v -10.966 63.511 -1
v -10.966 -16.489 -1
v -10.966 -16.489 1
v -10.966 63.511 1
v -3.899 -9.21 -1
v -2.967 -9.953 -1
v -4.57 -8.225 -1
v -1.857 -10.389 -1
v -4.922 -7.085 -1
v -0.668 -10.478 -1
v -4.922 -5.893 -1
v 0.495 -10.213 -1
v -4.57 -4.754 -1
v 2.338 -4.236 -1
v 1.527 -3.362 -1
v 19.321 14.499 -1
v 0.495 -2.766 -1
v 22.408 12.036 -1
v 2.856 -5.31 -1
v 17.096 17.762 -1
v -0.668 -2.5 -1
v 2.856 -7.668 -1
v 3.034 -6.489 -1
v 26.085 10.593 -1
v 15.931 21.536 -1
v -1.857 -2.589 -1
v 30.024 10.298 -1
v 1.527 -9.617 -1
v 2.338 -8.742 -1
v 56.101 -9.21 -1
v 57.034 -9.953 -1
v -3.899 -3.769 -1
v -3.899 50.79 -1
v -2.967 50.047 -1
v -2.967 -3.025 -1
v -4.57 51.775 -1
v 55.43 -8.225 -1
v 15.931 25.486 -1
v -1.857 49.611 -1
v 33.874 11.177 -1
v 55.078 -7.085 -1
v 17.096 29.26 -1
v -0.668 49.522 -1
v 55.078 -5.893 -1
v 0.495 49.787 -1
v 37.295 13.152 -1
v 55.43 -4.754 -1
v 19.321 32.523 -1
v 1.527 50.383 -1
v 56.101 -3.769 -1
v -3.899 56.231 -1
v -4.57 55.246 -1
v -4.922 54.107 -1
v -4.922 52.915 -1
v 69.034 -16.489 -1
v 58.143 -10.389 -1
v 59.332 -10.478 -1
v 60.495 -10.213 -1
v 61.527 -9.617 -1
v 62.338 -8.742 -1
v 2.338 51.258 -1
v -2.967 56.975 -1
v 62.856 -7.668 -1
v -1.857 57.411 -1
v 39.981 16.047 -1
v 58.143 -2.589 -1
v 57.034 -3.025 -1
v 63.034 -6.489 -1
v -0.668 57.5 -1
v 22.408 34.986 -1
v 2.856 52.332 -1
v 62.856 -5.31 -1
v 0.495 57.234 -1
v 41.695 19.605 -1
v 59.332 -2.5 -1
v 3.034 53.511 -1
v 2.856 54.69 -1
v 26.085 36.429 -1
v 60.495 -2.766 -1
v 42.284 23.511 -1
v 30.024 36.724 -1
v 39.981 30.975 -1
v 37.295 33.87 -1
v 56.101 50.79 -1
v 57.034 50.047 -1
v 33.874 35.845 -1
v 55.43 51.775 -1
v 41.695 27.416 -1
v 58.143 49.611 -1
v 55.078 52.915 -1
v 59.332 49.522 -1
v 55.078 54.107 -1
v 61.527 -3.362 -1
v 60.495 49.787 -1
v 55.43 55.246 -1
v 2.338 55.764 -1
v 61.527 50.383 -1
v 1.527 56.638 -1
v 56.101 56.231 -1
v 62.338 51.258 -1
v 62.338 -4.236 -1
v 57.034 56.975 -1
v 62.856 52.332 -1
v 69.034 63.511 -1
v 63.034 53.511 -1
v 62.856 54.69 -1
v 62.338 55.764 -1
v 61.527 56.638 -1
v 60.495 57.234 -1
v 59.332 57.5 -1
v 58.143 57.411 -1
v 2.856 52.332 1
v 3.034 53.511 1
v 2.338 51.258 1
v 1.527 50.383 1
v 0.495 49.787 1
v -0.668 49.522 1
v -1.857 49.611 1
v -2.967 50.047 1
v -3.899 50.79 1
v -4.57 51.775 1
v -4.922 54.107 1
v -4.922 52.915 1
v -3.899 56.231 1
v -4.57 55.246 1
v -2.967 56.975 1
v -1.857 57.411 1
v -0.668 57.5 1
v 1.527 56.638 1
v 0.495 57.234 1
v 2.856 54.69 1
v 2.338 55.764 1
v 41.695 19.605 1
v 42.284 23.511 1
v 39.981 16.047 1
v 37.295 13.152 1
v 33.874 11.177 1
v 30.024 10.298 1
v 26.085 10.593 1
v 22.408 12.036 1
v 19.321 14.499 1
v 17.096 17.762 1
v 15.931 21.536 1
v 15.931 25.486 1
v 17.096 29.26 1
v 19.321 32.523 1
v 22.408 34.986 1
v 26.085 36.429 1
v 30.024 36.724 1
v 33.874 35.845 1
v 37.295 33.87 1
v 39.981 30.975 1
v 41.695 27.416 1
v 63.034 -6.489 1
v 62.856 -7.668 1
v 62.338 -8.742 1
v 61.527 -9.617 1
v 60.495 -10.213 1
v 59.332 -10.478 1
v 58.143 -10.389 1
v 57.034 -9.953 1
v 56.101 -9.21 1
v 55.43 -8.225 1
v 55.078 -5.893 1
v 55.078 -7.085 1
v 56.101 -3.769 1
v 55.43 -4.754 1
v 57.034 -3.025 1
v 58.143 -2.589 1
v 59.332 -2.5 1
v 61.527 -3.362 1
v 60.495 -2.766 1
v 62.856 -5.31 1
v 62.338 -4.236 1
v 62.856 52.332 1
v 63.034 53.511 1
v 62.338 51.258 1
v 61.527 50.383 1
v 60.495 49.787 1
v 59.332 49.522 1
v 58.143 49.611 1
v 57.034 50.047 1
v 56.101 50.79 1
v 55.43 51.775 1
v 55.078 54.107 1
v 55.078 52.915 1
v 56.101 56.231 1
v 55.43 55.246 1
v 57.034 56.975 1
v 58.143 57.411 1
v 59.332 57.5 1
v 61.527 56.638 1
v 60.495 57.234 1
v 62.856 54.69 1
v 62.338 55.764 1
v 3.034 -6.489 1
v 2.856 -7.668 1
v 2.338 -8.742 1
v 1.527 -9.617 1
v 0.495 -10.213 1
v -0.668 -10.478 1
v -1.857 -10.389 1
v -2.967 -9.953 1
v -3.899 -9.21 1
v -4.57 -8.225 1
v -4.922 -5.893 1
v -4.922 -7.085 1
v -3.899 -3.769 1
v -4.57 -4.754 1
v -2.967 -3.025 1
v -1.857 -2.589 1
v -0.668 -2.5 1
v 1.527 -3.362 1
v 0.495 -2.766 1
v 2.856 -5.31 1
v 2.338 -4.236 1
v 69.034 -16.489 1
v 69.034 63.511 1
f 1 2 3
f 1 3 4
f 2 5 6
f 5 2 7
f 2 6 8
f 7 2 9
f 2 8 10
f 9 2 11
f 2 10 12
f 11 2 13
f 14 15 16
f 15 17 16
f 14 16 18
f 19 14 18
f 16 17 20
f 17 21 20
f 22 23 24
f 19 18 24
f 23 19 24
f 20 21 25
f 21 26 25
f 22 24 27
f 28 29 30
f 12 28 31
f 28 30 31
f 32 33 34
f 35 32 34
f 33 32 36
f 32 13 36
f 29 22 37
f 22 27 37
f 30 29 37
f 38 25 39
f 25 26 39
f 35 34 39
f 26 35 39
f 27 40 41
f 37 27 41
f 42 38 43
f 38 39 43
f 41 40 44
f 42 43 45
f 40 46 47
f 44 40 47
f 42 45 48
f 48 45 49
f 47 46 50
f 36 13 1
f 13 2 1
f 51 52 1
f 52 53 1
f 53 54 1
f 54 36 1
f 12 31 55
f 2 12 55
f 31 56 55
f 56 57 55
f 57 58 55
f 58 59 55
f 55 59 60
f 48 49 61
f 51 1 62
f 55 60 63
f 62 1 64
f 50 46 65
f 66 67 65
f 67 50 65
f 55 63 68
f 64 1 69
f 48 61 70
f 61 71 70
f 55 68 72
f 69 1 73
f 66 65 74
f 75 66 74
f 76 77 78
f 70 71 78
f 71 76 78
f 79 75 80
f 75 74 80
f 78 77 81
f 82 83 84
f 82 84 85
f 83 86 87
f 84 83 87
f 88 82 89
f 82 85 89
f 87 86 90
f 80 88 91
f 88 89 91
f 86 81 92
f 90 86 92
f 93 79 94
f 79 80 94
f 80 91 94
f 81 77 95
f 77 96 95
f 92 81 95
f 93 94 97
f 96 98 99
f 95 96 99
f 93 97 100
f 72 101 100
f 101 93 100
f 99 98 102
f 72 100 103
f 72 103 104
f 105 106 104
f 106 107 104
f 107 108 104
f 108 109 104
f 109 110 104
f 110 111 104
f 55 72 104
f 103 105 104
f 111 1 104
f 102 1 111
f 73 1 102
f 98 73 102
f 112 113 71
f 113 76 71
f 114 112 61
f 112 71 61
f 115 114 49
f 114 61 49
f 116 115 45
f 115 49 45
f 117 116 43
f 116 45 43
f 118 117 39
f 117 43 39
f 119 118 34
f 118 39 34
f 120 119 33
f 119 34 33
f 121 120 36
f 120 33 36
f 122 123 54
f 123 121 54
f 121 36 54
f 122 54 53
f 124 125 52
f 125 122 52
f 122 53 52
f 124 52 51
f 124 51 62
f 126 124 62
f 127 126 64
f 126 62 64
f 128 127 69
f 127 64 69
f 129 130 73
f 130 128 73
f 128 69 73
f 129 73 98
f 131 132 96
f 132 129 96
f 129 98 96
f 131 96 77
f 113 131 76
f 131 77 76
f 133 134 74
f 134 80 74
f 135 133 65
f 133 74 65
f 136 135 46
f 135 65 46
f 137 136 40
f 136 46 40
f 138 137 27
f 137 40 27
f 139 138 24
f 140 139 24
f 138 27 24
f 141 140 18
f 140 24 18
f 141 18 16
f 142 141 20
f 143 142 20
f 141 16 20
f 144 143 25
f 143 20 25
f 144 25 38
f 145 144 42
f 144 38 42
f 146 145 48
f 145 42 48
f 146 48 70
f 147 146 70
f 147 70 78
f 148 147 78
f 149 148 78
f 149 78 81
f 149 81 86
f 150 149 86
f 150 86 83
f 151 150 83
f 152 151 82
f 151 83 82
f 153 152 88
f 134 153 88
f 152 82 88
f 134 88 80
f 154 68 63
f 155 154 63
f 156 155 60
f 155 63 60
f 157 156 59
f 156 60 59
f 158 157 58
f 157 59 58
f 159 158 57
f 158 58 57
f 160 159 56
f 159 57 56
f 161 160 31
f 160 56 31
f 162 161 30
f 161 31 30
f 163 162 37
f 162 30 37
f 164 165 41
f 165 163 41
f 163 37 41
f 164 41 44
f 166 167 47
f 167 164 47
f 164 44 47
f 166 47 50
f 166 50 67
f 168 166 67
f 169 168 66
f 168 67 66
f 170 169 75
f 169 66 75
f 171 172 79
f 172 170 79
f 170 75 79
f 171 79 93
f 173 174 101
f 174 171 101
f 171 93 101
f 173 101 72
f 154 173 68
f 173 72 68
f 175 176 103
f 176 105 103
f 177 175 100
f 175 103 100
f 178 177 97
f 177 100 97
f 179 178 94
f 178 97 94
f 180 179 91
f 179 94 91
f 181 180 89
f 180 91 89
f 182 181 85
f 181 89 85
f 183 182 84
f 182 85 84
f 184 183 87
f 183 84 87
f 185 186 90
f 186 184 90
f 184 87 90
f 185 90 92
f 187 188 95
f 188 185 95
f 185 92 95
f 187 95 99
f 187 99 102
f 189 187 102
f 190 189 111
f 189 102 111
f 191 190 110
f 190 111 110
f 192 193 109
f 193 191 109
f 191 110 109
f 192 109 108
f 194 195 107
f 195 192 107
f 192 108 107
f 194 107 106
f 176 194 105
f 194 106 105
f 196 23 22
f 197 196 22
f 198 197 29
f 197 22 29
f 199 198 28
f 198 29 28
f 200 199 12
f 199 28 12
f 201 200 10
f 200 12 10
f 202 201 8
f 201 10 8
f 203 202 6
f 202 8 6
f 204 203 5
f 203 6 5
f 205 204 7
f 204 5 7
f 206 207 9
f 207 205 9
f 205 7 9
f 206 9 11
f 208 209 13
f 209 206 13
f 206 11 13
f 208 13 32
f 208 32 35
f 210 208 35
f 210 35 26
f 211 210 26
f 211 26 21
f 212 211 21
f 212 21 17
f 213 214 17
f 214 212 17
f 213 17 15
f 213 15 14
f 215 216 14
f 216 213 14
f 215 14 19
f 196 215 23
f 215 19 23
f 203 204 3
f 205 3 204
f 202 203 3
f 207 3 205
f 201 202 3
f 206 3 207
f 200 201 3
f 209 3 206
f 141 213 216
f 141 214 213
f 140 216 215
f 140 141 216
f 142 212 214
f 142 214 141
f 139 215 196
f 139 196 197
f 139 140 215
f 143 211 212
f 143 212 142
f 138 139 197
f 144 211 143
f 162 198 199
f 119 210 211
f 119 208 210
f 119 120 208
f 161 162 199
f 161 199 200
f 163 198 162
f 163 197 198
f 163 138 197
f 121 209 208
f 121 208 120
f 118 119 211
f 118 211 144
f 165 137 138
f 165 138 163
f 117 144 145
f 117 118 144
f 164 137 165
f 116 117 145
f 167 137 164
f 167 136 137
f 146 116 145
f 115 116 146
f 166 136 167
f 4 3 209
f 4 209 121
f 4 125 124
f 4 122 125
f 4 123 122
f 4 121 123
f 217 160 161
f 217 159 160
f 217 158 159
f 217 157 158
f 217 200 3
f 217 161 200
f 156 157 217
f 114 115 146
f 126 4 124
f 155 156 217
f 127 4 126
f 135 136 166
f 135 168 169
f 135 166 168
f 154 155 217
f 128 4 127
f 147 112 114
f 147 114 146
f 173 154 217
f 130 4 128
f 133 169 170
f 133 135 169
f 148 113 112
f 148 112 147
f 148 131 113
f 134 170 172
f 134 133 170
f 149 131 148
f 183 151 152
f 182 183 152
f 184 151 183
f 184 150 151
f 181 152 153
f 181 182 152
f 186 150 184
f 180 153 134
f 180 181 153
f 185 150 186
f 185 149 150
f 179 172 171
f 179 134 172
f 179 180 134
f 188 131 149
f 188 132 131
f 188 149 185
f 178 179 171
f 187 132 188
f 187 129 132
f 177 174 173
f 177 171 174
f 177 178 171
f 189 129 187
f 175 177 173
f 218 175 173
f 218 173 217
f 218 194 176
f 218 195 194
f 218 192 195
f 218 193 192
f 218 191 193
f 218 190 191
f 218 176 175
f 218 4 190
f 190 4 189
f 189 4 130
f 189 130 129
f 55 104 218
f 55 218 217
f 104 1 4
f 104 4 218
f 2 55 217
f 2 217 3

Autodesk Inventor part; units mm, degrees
ref_plane "YZ Plane" through (0, 0, 0) normal (1, 0, 0) x (0, 1, 0)
ref_plane "XZ Plane" through (0, 0, 0) normal (0, 1, 0) x (-1, 0, 0)
ref_plane "XY Plane" through (0, 0, 0) normal (0, 0, 1) x (1, 0, 0)
sketch "Sketch1" plane through (0, 0, 0) normal (0, 0, 1) x (1, 0, 0)
  line L0 (-10.9665, 63.5108) -> (69.0335, 63.5108)
  line L1 (69.0335, 63.5108) -> (69.0335, -16.4892)
  line L2 (69.0335, -16.4892) -> (-10.9665, -16.4892)
  line L3 (-10.9665, -16.4892) -> (-10.9665, 63.5108)
  circle A0 centre (-0.9665, 53.5108) radius 4
  line L4 (29.0335, 63.5108) -> (29.0335, 23.5108)
  line L5 (-10.9665, 23.5108) -> (29.0335, 23.5108)
  circle A1 centre (59.0335, 53.5108) radius 4
  circle A2 centre (-0.9665, -6.4892) radius 4
  circle A3 centre (59.0335, -6.4892) radius 4
  circle A4 centre (29.0335, 23.5108) radius 13.25
  point P0 (0, 0)
  dimension "d0" = 80
  dimension "d1" = 80
  dimension "d2" = 8
  dimension "d3" = 10
  dimension "d4" = 10
  dimension "d7" = 26.5
extrude "Plate1" add sketch "Sketch1" along normal mid plane 2
extrude "Cut1" cut sketch "Sketch1" against normal mid plane 2 contours A4 L5 L4 | L4 L5 A4
equation "\"d8\" = Thickness"
equation "\"d5\" = Thickness"
equation "\"BendRadius\" = Thickness"
equation "\"BendReliefWidth\" = Thickness"
equation "\"BendReliefDepth\" = 0.5 * Thickness"
equation "\"CornerReliefSize\" = 4 * Thickness"
equation "\"MinimumRemnant\" = 2 * Thickness"
equation "\"TransitionRadius\" = BendRadius"
equation "\"JacobiRadiusSize\" = BendRadius"
equation "\"GapSize\" = Thickness"
equation "\"Thickness\" = 2"
properties part number "plate"
